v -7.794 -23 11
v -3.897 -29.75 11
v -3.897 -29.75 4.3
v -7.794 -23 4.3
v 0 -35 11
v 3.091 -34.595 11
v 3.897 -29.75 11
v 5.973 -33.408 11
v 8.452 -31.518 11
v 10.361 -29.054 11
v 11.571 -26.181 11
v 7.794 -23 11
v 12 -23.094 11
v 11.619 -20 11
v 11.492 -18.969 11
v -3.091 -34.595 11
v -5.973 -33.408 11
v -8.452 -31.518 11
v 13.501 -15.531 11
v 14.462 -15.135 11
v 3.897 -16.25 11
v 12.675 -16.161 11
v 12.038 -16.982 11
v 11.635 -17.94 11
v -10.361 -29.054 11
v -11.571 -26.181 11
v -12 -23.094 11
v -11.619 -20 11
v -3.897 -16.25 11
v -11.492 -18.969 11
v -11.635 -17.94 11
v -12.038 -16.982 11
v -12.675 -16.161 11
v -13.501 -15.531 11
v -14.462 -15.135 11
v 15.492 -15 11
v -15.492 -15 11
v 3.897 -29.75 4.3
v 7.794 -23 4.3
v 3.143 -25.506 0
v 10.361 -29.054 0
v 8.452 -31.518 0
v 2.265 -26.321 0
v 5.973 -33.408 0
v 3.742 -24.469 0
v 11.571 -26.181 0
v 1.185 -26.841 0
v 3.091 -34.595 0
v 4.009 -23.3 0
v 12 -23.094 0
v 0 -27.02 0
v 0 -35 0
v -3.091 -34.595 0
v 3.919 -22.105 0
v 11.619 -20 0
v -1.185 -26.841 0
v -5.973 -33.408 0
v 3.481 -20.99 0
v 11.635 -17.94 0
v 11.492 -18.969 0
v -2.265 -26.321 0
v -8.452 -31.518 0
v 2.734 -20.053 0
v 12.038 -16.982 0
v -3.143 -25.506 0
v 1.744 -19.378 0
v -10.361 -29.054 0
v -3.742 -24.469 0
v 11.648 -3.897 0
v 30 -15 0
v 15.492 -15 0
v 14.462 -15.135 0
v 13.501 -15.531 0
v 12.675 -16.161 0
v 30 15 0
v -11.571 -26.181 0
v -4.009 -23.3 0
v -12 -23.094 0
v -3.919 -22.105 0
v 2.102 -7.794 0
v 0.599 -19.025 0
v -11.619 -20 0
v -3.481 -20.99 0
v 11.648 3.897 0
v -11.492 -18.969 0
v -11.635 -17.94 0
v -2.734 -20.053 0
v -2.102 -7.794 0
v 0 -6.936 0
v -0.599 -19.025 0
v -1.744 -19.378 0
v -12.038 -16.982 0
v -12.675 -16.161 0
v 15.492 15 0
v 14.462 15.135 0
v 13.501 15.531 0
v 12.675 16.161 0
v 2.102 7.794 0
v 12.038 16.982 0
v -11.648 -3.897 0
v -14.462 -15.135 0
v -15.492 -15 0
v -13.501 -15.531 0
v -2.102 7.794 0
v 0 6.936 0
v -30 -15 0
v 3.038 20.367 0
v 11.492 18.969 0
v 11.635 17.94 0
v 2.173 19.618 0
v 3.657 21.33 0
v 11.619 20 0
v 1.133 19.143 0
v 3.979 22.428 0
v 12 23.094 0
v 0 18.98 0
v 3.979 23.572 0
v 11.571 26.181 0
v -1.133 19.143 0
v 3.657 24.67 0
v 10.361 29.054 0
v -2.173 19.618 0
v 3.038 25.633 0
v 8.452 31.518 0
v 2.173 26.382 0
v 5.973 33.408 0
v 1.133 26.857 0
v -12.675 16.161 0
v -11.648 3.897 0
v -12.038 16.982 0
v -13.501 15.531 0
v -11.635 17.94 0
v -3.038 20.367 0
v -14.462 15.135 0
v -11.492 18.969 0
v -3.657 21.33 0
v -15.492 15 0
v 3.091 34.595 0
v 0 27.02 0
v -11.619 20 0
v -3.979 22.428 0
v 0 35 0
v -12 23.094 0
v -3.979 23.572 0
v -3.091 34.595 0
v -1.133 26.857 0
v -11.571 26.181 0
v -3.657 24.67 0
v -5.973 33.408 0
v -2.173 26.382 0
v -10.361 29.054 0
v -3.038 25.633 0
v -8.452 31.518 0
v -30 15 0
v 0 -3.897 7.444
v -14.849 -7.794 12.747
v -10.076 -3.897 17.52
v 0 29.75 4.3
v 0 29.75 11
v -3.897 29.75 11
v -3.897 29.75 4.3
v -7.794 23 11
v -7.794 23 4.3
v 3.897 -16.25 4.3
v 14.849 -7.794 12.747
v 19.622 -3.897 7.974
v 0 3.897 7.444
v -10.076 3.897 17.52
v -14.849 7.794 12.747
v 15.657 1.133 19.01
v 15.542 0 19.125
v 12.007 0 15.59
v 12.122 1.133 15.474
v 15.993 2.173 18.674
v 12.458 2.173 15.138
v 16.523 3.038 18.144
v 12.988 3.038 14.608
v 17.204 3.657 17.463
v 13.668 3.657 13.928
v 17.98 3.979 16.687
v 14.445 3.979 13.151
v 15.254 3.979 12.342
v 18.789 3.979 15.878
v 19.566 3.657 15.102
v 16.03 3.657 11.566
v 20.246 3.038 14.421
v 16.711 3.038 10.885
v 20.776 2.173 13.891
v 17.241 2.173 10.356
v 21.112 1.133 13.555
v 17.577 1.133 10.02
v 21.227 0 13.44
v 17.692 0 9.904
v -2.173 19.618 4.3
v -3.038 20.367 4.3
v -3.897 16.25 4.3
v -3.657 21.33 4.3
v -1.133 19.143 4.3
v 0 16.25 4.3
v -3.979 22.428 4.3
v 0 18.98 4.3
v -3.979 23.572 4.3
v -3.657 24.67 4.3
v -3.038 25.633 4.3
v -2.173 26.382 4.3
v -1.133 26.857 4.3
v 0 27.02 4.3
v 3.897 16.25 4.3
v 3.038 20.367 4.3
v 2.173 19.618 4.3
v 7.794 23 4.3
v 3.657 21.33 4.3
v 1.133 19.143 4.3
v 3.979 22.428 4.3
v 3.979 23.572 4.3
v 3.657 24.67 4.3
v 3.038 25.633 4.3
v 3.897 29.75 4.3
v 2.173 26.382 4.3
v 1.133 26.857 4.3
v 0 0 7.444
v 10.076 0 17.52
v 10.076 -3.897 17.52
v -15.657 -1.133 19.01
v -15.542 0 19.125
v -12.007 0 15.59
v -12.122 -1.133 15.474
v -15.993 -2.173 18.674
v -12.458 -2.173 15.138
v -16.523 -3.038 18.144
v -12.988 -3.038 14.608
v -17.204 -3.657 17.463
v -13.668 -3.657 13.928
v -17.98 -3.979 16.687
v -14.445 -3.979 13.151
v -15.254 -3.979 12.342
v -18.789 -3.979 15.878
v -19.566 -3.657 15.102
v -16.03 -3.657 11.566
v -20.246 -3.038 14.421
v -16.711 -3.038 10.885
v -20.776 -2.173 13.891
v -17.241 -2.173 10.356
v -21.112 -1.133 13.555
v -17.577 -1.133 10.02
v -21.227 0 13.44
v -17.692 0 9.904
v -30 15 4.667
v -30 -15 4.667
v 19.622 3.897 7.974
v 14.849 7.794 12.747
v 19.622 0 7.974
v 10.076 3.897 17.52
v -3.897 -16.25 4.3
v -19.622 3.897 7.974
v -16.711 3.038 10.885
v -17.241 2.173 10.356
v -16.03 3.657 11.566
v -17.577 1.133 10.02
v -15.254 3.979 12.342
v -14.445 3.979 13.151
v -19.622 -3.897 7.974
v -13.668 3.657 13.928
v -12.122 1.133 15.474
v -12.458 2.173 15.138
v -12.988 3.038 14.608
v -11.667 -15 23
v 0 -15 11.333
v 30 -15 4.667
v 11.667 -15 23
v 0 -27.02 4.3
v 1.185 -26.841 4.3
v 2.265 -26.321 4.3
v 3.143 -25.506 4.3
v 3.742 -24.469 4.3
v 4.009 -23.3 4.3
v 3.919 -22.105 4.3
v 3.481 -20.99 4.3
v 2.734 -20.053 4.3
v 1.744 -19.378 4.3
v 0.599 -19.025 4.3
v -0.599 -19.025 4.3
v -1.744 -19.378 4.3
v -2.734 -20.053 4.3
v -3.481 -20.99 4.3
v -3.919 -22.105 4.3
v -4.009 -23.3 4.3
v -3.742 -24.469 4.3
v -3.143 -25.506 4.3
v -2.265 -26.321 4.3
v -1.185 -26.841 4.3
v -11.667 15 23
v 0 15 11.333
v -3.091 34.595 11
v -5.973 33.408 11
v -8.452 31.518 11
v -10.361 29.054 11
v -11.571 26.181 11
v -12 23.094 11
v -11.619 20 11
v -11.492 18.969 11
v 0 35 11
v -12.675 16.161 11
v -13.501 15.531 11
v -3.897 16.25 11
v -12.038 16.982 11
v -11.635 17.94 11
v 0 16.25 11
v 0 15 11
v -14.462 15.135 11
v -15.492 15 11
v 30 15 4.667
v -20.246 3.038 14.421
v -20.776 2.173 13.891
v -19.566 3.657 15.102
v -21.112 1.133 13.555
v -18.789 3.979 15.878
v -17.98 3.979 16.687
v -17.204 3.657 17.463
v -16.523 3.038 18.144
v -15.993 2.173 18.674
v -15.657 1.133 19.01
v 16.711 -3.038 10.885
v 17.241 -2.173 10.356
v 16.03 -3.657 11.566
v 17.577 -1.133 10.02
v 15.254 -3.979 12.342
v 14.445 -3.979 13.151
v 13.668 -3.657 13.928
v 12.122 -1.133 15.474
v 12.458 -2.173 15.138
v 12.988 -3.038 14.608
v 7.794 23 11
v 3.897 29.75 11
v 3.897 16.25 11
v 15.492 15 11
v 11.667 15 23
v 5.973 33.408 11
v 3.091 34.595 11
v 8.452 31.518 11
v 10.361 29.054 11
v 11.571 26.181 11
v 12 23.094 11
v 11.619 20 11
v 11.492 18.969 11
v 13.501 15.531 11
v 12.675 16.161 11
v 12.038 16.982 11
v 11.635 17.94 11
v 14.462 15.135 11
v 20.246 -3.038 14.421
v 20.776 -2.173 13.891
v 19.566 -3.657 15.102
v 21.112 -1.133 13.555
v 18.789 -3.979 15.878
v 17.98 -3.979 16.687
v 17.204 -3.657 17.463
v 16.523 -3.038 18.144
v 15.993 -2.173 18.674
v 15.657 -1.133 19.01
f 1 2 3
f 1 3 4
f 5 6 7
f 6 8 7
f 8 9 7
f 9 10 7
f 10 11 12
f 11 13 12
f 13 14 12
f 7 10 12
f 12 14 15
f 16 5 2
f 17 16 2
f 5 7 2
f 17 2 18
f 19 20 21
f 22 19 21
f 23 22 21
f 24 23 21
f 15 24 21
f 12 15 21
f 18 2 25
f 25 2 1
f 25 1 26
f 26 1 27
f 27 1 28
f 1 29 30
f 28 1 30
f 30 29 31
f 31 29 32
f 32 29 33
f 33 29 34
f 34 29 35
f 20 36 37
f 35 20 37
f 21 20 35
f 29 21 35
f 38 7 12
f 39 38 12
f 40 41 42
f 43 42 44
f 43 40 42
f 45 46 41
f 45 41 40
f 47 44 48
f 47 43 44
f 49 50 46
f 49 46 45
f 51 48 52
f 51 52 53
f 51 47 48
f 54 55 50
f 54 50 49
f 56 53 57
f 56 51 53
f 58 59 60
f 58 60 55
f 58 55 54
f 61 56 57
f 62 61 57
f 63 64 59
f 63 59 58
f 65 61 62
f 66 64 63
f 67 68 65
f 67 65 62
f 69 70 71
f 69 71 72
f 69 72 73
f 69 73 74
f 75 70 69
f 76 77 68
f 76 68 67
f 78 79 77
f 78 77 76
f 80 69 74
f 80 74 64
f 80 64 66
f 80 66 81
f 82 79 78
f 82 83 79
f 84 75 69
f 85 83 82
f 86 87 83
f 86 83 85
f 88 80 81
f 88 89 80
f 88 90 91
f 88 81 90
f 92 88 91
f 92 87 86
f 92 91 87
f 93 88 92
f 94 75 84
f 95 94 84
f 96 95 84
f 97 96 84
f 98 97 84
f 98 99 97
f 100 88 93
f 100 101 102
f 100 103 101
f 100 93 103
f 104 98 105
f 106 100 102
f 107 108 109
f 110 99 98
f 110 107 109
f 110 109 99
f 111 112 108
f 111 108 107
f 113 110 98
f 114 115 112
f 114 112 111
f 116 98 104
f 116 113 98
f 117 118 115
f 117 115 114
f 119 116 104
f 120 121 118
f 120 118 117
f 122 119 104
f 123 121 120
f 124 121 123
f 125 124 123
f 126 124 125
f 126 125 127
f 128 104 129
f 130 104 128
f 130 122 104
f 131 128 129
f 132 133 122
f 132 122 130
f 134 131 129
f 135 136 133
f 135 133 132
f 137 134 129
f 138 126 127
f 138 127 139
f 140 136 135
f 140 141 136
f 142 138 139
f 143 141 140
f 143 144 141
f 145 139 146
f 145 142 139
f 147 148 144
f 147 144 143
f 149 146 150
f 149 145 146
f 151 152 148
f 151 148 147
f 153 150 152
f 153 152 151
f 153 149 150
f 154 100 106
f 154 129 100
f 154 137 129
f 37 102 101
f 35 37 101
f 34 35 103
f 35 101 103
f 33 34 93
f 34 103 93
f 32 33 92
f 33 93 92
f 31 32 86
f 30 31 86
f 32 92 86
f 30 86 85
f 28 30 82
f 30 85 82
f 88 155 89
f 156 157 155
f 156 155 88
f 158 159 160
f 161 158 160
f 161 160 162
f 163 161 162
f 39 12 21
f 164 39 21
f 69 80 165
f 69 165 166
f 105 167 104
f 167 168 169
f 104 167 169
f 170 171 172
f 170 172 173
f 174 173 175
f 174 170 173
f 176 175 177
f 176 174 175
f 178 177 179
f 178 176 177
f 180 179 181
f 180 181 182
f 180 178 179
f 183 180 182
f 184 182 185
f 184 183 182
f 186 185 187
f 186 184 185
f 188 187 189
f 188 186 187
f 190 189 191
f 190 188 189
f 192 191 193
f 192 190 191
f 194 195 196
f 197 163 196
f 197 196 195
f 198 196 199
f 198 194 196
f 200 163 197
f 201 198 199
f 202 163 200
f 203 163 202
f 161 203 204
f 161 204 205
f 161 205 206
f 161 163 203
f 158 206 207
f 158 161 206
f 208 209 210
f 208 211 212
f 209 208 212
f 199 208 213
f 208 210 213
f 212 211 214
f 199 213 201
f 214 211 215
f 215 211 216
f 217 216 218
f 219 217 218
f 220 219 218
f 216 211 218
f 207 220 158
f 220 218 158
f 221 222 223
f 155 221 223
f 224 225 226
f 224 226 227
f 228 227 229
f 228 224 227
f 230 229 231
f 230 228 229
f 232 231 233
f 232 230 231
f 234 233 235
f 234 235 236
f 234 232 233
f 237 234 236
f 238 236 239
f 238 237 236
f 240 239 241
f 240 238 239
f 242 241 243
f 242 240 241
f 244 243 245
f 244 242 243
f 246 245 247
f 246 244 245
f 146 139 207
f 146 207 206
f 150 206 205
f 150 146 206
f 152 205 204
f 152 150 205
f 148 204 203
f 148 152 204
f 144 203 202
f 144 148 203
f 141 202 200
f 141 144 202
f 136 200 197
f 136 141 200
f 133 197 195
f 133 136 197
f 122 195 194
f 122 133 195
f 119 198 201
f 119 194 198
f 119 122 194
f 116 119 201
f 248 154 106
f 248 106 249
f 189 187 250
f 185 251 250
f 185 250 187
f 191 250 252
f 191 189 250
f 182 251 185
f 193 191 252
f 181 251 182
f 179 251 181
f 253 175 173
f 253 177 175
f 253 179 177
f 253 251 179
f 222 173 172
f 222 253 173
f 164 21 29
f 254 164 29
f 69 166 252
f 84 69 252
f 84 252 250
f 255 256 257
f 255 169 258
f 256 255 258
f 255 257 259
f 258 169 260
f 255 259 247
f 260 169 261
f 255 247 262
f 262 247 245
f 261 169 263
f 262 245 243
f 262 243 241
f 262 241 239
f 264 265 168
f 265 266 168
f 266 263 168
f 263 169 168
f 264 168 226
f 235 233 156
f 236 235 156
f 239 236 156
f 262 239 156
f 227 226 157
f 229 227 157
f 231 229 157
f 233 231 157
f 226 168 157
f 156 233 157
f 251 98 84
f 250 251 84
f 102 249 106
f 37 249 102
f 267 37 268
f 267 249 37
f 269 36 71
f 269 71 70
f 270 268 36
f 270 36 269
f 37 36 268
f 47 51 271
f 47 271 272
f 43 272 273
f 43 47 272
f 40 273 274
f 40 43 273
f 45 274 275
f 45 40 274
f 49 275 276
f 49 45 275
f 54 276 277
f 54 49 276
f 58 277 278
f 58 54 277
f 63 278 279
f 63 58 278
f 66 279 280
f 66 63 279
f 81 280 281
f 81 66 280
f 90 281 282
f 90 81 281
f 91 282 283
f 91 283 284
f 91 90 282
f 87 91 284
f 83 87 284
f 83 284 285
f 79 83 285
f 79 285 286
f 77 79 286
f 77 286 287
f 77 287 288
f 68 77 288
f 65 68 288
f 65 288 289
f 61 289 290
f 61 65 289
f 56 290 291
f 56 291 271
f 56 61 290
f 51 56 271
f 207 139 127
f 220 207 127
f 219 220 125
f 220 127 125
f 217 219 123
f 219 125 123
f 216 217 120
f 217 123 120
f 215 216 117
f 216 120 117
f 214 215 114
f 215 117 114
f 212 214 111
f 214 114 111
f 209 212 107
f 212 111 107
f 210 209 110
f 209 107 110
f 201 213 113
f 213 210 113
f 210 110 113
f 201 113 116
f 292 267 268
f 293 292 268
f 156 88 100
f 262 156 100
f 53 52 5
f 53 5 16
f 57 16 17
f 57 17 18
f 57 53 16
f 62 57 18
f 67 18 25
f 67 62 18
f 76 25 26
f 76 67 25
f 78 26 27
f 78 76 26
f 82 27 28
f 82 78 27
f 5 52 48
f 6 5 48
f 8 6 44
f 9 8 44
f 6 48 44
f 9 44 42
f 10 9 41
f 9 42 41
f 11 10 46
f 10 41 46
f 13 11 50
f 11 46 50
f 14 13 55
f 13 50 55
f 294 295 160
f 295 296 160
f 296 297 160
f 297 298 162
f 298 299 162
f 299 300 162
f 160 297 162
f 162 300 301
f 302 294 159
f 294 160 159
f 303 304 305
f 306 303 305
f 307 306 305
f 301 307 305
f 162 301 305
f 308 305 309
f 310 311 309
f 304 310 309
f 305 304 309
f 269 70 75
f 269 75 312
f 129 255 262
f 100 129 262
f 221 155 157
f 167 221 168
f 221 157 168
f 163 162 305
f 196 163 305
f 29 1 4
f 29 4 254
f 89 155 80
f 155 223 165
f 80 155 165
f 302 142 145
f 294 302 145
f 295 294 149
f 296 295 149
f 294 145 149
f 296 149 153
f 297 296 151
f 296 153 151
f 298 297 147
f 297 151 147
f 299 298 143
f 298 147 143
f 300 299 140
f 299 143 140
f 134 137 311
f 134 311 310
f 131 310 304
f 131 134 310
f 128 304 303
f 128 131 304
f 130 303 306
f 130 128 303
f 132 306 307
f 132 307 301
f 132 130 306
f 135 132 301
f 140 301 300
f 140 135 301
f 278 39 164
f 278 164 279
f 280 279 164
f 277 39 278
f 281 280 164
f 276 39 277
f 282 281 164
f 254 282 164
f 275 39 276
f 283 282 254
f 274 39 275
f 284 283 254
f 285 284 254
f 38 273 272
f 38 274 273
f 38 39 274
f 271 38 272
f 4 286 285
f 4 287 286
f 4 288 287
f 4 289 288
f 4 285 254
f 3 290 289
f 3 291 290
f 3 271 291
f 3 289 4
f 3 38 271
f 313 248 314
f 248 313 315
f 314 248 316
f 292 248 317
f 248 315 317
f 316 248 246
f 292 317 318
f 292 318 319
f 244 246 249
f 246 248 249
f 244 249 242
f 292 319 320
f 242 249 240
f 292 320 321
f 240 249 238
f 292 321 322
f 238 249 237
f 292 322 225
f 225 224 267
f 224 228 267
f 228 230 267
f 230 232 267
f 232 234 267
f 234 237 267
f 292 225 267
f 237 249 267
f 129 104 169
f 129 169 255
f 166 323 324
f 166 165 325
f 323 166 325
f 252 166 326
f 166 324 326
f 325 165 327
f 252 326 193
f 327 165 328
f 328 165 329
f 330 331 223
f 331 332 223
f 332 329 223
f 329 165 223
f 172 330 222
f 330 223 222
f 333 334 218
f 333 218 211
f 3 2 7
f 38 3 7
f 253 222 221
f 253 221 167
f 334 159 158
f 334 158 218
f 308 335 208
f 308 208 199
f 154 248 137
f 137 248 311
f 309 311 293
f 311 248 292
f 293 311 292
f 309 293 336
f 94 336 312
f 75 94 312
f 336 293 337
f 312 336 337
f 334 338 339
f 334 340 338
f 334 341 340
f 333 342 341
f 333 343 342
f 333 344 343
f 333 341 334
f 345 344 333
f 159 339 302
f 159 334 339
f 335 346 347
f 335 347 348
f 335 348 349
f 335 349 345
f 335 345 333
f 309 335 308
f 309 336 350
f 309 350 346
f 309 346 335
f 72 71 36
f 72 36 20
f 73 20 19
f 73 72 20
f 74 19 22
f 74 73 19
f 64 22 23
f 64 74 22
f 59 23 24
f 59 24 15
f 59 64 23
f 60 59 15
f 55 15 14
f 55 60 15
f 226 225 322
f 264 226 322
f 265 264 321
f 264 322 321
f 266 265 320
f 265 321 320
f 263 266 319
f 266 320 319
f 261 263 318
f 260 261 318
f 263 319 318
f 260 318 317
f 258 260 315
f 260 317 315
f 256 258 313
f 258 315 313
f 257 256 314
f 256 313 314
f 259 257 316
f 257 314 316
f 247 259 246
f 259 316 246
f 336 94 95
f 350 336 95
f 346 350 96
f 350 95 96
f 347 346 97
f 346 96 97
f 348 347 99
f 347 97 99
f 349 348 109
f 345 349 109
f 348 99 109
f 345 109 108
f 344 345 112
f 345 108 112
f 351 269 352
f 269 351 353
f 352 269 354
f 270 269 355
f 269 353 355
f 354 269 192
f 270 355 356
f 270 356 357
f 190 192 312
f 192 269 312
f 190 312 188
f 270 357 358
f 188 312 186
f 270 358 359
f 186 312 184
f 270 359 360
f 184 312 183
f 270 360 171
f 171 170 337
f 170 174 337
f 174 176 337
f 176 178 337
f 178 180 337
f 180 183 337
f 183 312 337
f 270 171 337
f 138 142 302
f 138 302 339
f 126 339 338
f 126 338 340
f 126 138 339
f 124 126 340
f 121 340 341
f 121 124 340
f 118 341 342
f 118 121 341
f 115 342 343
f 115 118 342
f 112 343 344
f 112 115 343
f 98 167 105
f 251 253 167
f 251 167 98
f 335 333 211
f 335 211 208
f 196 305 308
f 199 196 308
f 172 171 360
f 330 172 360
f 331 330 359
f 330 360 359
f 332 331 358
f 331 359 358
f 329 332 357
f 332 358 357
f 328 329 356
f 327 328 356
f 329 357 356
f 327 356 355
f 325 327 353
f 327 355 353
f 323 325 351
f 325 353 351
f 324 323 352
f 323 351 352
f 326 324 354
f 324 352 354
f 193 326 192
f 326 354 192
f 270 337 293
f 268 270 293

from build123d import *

# Parameters (mm, degrees)
PAD_DEPTH       = 15
PAD001_DEPTH    = 11
SKETCH002_R     = 4.02
HOLE_DEPTH      = 25
POCKET_DEPTH    = 21
POCKET001_DEPTH = 6.7


with BuildPart() as body:
    # Sketch → Pad (new body)
    with BuildSketch(Plane.XZ):
        Polygon((30, 4.667262), (11.667262, 23), (0, 11.332738), (0, 0), (30, 0), align=None)
    extrude(amount=PAD_DEPTH)

    # Sketch001 → Pad001 (join)
    with BuildSketch(Plane.XY):
        with BuildLine():
            ThreePointArc((0, -27.02), (4.02, -23), (0, -18.98))
            Line((0, -18.98), (0, -15))
            Line((0, -15), (15.491933, -15))
            ThreePointArc((15.491933, -15), (12.329656, -16.55051), (11.61895, -20))
            ThreePointArc((0, -35), (9.486833, -30.348469), (11.61895, -20))
            Line((0, -35), (0, -27.02))
        make_face()
    extrude(amount=PAD001_DEPTH)

    # Sketch002 (on DatumPlane) → Hole (cut)
    with BuildSketch(Plane(origin=(17.333631, 0, 17.333631), x_dir=(-0.707107, 0, 0.707107), z_dir=(0.707107, 0, 0.707107))):
        with Locations((-1.486544, 0)):
            Circle(SKETCH002_R)
    extrude(amount=-HOLE_DEPTH, mode=Mode.SUBTRACT)

    # Sketch003 (on DatumPlane) → Pocket (cut)
    with BuildSketch(Plane(origin=(8.131728, 0, 19.464466), x_dir=(0, 1, 0), z_dir=(0.707107, 0, 0.707107))):
        Polygon((-7.794229, -9.5), (-3.897114, -16.25), (3.897114, -16.25), (7.794229, -9.5), (3.897114, -2.75), (-3.897114, -2.75), align=None)
    extrude(amount=-POCKET_DEPTH, mode=Mode.SUBTRACT)

    # Sketch004 (on Face13 of Pocket) → Pocket001 (cut)
    with BuildSketch(Plane(origin=(0, 0, 11), x_dir=(-1, 0, 0), z_dir=(0, 0, 1))):
        Polygon((-3.897114, 29.75), (-7.794229, 23), (-3.897114, 16.25), (3.897114, 16.25), (7.794229, 23), (3.897114, 29.75), align=None)
    extrude(amount=-POCKET001_DEPTH, mode=Mode.SUBTRACT)


with BuildPart() as part_mirroring:
    # Part__Mirroring: instance of Body
    add(body.part.mirror(Plane(origin=(0, 0, 0), x_dir=(1, 0, 0), z_dir=(0, 1, 0))))


with BuildPart() as part_mirroring001:
    # Part__Mirroring001: instance of Part__Mirroring
    add(part_mirroring.part.mirror(Plane(origin=(0, 0, 0), x_dir=(0, -1, 0), z_dir=(1, 0, 0))))


with BuildPart() as fusion:
    # Part__Mirroring002: instance of Body
    add(body.part.mirror(Plane(origin=(0, 0, 0), x_dir=(0, -1, 0), z_dir=(1, 0, 0))))

    # Fusion: union Part__Mirroring001, Part__Mirroring, Body
    add(part_mirroring001.part)
    add(part_mirroring.part)
    add(body.part)


solid = fusion.part
